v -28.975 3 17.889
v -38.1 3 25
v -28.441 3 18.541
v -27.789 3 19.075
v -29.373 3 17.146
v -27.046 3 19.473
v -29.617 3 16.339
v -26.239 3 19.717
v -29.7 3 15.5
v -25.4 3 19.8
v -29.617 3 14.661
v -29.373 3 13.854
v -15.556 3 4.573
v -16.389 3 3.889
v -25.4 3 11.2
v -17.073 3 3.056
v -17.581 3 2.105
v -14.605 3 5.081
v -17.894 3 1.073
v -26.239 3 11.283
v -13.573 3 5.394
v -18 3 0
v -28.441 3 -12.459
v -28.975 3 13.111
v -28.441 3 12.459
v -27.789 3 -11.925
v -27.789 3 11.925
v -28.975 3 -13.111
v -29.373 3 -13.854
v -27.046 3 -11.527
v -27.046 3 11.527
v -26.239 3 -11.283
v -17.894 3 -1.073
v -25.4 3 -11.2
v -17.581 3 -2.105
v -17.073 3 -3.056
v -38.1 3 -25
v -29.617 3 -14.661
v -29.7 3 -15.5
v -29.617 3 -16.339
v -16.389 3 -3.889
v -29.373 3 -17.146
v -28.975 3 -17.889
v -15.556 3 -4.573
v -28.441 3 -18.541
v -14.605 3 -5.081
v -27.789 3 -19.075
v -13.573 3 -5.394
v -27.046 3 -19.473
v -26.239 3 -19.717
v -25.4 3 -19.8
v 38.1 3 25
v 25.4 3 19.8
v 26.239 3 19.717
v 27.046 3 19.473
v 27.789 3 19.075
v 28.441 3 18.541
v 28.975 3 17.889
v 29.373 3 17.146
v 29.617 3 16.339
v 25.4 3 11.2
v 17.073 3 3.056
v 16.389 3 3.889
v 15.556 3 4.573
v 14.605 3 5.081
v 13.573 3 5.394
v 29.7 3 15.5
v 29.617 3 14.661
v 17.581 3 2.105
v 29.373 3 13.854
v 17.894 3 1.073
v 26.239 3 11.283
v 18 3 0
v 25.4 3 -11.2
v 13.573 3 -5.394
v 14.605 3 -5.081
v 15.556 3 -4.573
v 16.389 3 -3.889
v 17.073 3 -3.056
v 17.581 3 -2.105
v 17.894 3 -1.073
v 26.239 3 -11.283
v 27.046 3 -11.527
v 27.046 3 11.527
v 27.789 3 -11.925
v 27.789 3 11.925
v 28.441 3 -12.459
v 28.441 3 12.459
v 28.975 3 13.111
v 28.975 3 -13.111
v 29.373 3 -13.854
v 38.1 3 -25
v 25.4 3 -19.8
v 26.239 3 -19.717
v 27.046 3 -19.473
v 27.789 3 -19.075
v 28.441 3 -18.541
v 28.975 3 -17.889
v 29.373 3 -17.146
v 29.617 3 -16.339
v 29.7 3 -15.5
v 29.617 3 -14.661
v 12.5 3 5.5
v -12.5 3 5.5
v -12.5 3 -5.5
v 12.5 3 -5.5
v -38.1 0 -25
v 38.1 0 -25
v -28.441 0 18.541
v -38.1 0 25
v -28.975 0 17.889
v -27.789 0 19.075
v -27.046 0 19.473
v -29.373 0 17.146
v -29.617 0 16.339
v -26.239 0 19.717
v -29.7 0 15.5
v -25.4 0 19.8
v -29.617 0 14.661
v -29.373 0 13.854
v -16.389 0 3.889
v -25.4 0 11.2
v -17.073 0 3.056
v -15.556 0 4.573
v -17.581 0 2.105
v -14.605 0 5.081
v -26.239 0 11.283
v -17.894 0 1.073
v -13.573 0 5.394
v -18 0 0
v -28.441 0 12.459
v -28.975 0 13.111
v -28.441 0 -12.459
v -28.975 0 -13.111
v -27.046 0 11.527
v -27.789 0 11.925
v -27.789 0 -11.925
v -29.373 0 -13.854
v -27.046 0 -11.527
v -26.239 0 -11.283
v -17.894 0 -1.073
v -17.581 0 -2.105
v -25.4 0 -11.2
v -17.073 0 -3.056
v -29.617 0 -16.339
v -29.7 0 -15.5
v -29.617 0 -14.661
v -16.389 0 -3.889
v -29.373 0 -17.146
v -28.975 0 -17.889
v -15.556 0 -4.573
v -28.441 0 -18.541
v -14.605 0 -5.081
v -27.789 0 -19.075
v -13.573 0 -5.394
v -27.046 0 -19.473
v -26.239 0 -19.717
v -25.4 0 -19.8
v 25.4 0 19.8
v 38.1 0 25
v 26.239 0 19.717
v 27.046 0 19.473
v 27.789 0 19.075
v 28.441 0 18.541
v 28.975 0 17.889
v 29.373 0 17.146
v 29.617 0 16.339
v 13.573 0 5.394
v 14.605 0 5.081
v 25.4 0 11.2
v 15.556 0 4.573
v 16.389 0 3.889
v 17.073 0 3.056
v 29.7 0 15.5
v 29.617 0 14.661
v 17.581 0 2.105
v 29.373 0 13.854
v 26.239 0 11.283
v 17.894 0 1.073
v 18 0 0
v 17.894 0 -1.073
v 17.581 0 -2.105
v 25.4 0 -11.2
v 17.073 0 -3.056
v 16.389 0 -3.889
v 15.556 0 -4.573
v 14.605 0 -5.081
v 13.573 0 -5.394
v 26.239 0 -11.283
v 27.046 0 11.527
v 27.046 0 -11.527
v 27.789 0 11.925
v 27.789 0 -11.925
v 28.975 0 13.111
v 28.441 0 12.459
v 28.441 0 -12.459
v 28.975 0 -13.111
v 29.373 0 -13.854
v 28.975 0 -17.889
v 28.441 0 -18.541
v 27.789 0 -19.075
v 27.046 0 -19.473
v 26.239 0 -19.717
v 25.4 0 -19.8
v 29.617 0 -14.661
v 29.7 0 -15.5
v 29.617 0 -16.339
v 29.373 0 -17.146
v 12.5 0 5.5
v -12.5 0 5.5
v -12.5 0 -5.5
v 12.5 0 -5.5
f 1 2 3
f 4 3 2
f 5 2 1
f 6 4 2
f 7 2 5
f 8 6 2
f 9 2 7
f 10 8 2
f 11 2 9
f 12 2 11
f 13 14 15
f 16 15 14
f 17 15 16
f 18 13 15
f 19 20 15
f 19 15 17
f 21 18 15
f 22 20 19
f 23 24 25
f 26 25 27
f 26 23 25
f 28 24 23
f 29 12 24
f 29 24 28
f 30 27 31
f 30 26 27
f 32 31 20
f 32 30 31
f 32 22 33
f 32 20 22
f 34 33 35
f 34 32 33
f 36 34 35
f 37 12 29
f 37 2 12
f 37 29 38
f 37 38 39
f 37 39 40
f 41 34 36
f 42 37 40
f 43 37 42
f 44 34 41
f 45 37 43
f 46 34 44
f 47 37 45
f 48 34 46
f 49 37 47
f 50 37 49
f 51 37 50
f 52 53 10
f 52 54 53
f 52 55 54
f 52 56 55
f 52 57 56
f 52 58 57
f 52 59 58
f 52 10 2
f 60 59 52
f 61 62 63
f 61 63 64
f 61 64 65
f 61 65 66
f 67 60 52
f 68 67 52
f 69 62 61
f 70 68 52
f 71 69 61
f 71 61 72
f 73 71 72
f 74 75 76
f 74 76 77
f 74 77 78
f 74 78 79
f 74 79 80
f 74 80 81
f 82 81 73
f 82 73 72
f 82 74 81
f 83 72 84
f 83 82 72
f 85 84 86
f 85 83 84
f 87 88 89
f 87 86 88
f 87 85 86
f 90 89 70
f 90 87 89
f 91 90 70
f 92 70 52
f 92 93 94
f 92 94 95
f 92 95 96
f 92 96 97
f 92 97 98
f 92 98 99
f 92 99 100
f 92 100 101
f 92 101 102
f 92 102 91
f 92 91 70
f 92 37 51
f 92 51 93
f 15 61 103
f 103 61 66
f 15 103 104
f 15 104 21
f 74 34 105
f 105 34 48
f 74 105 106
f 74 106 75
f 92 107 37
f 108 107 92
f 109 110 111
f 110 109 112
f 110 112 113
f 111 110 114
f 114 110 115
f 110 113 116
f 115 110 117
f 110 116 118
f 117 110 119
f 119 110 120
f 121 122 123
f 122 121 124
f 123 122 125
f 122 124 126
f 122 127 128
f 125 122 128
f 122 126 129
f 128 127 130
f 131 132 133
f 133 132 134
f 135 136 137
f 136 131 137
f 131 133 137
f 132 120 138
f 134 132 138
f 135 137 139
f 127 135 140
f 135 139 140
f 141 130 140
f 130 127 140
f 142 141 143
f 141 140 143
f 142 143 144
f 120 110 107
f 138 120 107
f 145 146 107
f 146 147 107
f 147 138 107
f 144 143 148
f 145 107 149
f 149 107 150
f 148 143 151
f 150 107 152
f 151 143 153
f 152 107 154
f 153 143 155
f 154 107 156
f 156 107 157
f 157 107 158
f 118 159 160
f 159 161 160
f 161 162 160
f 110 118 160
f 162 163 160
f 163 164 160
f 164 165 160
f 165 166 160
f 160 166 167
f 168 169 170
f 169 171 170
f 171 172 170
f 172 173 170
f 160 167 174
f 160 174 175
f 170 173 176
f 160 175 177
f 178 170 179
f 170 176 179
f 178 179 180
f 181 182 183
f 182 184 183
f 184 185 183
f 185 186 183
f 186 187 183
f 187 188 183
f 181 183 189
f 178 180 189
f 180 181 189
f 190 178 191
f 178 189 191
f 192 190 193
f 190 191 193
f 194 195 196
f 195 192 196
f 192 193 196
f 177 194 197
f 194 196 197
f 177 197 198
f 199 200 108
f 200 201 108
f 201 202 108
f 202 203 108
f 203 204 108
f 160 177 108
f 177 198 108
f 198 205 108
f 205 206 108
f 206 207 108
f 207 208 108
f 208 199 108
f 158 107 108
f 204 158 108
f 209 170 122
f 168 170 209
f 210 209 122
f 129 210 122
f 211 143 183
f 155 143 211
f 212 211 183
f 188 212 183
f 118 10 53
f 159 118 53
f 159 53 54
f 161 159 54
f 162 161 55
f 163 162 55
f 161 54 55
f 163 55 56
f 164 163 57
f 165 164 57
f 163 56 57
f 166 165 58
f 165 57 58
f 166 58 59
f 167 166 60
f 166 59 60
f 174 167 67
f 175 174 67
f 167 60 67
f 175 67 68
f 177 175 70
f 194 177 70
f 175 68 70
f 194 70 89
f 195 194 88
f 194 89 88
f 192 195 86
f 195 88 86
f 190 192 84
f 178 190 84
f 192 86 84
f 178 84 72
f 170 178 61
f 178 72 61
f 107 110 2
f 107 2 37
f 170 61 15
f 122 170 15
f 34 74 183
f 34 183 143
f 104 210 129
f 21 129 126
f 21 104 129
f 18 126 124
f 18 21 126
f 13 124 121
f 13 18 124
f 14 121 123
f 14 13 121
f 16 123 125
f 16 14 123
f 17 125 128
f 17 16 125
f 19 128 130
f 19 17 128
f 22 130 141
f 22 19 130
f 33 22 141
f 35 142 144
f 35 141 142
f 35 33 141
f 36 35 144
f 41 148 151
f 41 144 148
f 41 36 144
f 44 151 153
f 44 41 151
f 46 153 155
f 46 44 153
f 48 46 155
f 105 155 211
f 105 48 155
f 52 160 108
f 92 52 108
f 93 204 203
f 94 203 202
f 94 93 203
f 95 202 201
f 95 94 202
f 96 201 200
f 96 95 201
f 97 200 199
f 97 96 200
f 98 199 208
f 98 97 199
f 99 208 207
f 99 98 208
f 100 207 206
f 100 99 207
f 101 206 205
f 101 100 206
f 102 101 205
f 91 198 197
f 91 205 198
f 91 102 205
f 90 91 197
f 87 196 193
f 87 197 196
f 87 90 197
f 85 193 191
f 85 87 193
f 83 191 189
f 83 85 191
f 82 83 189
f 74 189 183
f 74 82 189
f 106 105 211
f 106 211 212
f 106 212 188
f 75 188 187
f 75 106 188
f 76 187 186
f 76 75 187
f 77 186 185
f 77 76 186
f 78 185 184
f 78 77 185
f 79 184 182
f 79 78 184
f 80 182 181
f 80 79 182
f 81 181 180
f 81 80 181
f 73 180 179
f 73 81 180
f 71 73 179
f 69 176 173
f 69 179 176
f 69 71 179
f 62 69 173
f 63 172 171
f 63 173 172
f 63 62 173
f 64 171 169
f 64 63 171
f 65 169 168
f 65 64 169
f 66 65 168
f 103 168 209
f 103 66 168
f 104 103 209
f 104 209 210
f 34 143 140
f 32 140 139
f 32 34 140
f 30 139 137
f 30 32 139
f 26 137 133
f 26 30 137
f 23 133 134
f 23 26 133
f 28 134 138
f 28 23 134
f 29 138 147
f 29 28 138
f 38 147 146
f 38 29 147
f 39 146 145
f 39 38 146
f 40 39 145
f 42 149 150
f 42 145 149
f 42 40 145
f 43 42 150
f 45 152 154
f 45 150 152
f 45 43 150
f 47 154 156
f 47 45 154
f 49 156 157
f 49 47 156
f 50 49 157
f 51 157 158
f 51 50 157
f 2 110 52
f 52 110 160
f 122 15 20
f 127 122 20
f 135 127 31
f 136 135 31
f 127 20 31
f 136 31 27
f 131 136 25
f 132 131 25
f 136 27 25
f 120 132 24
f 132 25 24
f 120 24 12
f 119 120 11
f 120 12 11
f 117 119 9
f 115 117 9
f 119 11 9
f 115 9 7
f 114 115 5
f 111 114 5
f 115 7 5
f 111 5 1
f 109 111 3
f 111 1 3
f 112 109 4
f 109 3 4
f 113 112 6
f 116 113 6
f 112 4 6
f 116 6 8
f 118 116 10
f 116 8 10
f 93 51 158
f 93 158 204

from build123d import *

# Parameters (mm, degrees)
SKETCH1_W           = 76.2
SKETCH1_H           = 50
BOSS_EXTRUDE1_DEPTH = 3
CUT_EXTRUDE1_DEPTH  = 4


with BuildPart() as part:
    # Sketch1 → Boss-Extrude1 (new body)
    with BuildSketch(Plane(origin=(0, 0, 0), x_dir=(1, 0, 0), z_dir=(0, 1, 0))):
        Rectangle(SKETCH1_W, SKETCH1_H)
    extrude(amount=BOSS_EXTRUDE1_DEPTH)

    # Sketch2 → Cut-Extrude1 (cut, through all)
    with BuildSketch(Plane(origin=(0, 3, 0), x_dir=(1, 0, 0), z_dir=(0, 1, 0))):
        with BuildLine():
            Line((-25.4, 19.8), (25.4, 19.8))
            ThreePointArc((25.4, 19.8), (29.7, 15.5), (25.4, 11.2))
            Line((25.4, 11.2), (-25.4, 11.2))
            ThreePointArc((-25.4, 11.2), (-29.7, 15.5), (-25.4, 19.8))
        make_face()
        with BuildLine():
            Line((-25.4, -19.8), (25.4, -19.8))
            ThreePointArc((25.4, -19.8), (29.7, -15.5), (25.4, -11.2))
            Line((25.4, -11.2), (-25.4, -11.2))
            ThreePointArc((-25.4, -11.2), (-29.7, -15.5), (-25.4, -19.8))
        make_face()
        with BuildLine():
            Line((-12.5, 5.5), (12.5, 5.5))
            ThreePointArc((12.5, 5.5), (18, 0), (12.5, -5.5))
            Line((12.5, -5.5), (-12.5, -5.5))
            ThreePointArc((-12.5, -5.5), (-18, 0), (-12.5, 5.5))
        make_face()
    extrude(amount=-CUT_EXTRUDE1_DEPTH, mode=Mode.SUBTRACT)


solid = part.part
